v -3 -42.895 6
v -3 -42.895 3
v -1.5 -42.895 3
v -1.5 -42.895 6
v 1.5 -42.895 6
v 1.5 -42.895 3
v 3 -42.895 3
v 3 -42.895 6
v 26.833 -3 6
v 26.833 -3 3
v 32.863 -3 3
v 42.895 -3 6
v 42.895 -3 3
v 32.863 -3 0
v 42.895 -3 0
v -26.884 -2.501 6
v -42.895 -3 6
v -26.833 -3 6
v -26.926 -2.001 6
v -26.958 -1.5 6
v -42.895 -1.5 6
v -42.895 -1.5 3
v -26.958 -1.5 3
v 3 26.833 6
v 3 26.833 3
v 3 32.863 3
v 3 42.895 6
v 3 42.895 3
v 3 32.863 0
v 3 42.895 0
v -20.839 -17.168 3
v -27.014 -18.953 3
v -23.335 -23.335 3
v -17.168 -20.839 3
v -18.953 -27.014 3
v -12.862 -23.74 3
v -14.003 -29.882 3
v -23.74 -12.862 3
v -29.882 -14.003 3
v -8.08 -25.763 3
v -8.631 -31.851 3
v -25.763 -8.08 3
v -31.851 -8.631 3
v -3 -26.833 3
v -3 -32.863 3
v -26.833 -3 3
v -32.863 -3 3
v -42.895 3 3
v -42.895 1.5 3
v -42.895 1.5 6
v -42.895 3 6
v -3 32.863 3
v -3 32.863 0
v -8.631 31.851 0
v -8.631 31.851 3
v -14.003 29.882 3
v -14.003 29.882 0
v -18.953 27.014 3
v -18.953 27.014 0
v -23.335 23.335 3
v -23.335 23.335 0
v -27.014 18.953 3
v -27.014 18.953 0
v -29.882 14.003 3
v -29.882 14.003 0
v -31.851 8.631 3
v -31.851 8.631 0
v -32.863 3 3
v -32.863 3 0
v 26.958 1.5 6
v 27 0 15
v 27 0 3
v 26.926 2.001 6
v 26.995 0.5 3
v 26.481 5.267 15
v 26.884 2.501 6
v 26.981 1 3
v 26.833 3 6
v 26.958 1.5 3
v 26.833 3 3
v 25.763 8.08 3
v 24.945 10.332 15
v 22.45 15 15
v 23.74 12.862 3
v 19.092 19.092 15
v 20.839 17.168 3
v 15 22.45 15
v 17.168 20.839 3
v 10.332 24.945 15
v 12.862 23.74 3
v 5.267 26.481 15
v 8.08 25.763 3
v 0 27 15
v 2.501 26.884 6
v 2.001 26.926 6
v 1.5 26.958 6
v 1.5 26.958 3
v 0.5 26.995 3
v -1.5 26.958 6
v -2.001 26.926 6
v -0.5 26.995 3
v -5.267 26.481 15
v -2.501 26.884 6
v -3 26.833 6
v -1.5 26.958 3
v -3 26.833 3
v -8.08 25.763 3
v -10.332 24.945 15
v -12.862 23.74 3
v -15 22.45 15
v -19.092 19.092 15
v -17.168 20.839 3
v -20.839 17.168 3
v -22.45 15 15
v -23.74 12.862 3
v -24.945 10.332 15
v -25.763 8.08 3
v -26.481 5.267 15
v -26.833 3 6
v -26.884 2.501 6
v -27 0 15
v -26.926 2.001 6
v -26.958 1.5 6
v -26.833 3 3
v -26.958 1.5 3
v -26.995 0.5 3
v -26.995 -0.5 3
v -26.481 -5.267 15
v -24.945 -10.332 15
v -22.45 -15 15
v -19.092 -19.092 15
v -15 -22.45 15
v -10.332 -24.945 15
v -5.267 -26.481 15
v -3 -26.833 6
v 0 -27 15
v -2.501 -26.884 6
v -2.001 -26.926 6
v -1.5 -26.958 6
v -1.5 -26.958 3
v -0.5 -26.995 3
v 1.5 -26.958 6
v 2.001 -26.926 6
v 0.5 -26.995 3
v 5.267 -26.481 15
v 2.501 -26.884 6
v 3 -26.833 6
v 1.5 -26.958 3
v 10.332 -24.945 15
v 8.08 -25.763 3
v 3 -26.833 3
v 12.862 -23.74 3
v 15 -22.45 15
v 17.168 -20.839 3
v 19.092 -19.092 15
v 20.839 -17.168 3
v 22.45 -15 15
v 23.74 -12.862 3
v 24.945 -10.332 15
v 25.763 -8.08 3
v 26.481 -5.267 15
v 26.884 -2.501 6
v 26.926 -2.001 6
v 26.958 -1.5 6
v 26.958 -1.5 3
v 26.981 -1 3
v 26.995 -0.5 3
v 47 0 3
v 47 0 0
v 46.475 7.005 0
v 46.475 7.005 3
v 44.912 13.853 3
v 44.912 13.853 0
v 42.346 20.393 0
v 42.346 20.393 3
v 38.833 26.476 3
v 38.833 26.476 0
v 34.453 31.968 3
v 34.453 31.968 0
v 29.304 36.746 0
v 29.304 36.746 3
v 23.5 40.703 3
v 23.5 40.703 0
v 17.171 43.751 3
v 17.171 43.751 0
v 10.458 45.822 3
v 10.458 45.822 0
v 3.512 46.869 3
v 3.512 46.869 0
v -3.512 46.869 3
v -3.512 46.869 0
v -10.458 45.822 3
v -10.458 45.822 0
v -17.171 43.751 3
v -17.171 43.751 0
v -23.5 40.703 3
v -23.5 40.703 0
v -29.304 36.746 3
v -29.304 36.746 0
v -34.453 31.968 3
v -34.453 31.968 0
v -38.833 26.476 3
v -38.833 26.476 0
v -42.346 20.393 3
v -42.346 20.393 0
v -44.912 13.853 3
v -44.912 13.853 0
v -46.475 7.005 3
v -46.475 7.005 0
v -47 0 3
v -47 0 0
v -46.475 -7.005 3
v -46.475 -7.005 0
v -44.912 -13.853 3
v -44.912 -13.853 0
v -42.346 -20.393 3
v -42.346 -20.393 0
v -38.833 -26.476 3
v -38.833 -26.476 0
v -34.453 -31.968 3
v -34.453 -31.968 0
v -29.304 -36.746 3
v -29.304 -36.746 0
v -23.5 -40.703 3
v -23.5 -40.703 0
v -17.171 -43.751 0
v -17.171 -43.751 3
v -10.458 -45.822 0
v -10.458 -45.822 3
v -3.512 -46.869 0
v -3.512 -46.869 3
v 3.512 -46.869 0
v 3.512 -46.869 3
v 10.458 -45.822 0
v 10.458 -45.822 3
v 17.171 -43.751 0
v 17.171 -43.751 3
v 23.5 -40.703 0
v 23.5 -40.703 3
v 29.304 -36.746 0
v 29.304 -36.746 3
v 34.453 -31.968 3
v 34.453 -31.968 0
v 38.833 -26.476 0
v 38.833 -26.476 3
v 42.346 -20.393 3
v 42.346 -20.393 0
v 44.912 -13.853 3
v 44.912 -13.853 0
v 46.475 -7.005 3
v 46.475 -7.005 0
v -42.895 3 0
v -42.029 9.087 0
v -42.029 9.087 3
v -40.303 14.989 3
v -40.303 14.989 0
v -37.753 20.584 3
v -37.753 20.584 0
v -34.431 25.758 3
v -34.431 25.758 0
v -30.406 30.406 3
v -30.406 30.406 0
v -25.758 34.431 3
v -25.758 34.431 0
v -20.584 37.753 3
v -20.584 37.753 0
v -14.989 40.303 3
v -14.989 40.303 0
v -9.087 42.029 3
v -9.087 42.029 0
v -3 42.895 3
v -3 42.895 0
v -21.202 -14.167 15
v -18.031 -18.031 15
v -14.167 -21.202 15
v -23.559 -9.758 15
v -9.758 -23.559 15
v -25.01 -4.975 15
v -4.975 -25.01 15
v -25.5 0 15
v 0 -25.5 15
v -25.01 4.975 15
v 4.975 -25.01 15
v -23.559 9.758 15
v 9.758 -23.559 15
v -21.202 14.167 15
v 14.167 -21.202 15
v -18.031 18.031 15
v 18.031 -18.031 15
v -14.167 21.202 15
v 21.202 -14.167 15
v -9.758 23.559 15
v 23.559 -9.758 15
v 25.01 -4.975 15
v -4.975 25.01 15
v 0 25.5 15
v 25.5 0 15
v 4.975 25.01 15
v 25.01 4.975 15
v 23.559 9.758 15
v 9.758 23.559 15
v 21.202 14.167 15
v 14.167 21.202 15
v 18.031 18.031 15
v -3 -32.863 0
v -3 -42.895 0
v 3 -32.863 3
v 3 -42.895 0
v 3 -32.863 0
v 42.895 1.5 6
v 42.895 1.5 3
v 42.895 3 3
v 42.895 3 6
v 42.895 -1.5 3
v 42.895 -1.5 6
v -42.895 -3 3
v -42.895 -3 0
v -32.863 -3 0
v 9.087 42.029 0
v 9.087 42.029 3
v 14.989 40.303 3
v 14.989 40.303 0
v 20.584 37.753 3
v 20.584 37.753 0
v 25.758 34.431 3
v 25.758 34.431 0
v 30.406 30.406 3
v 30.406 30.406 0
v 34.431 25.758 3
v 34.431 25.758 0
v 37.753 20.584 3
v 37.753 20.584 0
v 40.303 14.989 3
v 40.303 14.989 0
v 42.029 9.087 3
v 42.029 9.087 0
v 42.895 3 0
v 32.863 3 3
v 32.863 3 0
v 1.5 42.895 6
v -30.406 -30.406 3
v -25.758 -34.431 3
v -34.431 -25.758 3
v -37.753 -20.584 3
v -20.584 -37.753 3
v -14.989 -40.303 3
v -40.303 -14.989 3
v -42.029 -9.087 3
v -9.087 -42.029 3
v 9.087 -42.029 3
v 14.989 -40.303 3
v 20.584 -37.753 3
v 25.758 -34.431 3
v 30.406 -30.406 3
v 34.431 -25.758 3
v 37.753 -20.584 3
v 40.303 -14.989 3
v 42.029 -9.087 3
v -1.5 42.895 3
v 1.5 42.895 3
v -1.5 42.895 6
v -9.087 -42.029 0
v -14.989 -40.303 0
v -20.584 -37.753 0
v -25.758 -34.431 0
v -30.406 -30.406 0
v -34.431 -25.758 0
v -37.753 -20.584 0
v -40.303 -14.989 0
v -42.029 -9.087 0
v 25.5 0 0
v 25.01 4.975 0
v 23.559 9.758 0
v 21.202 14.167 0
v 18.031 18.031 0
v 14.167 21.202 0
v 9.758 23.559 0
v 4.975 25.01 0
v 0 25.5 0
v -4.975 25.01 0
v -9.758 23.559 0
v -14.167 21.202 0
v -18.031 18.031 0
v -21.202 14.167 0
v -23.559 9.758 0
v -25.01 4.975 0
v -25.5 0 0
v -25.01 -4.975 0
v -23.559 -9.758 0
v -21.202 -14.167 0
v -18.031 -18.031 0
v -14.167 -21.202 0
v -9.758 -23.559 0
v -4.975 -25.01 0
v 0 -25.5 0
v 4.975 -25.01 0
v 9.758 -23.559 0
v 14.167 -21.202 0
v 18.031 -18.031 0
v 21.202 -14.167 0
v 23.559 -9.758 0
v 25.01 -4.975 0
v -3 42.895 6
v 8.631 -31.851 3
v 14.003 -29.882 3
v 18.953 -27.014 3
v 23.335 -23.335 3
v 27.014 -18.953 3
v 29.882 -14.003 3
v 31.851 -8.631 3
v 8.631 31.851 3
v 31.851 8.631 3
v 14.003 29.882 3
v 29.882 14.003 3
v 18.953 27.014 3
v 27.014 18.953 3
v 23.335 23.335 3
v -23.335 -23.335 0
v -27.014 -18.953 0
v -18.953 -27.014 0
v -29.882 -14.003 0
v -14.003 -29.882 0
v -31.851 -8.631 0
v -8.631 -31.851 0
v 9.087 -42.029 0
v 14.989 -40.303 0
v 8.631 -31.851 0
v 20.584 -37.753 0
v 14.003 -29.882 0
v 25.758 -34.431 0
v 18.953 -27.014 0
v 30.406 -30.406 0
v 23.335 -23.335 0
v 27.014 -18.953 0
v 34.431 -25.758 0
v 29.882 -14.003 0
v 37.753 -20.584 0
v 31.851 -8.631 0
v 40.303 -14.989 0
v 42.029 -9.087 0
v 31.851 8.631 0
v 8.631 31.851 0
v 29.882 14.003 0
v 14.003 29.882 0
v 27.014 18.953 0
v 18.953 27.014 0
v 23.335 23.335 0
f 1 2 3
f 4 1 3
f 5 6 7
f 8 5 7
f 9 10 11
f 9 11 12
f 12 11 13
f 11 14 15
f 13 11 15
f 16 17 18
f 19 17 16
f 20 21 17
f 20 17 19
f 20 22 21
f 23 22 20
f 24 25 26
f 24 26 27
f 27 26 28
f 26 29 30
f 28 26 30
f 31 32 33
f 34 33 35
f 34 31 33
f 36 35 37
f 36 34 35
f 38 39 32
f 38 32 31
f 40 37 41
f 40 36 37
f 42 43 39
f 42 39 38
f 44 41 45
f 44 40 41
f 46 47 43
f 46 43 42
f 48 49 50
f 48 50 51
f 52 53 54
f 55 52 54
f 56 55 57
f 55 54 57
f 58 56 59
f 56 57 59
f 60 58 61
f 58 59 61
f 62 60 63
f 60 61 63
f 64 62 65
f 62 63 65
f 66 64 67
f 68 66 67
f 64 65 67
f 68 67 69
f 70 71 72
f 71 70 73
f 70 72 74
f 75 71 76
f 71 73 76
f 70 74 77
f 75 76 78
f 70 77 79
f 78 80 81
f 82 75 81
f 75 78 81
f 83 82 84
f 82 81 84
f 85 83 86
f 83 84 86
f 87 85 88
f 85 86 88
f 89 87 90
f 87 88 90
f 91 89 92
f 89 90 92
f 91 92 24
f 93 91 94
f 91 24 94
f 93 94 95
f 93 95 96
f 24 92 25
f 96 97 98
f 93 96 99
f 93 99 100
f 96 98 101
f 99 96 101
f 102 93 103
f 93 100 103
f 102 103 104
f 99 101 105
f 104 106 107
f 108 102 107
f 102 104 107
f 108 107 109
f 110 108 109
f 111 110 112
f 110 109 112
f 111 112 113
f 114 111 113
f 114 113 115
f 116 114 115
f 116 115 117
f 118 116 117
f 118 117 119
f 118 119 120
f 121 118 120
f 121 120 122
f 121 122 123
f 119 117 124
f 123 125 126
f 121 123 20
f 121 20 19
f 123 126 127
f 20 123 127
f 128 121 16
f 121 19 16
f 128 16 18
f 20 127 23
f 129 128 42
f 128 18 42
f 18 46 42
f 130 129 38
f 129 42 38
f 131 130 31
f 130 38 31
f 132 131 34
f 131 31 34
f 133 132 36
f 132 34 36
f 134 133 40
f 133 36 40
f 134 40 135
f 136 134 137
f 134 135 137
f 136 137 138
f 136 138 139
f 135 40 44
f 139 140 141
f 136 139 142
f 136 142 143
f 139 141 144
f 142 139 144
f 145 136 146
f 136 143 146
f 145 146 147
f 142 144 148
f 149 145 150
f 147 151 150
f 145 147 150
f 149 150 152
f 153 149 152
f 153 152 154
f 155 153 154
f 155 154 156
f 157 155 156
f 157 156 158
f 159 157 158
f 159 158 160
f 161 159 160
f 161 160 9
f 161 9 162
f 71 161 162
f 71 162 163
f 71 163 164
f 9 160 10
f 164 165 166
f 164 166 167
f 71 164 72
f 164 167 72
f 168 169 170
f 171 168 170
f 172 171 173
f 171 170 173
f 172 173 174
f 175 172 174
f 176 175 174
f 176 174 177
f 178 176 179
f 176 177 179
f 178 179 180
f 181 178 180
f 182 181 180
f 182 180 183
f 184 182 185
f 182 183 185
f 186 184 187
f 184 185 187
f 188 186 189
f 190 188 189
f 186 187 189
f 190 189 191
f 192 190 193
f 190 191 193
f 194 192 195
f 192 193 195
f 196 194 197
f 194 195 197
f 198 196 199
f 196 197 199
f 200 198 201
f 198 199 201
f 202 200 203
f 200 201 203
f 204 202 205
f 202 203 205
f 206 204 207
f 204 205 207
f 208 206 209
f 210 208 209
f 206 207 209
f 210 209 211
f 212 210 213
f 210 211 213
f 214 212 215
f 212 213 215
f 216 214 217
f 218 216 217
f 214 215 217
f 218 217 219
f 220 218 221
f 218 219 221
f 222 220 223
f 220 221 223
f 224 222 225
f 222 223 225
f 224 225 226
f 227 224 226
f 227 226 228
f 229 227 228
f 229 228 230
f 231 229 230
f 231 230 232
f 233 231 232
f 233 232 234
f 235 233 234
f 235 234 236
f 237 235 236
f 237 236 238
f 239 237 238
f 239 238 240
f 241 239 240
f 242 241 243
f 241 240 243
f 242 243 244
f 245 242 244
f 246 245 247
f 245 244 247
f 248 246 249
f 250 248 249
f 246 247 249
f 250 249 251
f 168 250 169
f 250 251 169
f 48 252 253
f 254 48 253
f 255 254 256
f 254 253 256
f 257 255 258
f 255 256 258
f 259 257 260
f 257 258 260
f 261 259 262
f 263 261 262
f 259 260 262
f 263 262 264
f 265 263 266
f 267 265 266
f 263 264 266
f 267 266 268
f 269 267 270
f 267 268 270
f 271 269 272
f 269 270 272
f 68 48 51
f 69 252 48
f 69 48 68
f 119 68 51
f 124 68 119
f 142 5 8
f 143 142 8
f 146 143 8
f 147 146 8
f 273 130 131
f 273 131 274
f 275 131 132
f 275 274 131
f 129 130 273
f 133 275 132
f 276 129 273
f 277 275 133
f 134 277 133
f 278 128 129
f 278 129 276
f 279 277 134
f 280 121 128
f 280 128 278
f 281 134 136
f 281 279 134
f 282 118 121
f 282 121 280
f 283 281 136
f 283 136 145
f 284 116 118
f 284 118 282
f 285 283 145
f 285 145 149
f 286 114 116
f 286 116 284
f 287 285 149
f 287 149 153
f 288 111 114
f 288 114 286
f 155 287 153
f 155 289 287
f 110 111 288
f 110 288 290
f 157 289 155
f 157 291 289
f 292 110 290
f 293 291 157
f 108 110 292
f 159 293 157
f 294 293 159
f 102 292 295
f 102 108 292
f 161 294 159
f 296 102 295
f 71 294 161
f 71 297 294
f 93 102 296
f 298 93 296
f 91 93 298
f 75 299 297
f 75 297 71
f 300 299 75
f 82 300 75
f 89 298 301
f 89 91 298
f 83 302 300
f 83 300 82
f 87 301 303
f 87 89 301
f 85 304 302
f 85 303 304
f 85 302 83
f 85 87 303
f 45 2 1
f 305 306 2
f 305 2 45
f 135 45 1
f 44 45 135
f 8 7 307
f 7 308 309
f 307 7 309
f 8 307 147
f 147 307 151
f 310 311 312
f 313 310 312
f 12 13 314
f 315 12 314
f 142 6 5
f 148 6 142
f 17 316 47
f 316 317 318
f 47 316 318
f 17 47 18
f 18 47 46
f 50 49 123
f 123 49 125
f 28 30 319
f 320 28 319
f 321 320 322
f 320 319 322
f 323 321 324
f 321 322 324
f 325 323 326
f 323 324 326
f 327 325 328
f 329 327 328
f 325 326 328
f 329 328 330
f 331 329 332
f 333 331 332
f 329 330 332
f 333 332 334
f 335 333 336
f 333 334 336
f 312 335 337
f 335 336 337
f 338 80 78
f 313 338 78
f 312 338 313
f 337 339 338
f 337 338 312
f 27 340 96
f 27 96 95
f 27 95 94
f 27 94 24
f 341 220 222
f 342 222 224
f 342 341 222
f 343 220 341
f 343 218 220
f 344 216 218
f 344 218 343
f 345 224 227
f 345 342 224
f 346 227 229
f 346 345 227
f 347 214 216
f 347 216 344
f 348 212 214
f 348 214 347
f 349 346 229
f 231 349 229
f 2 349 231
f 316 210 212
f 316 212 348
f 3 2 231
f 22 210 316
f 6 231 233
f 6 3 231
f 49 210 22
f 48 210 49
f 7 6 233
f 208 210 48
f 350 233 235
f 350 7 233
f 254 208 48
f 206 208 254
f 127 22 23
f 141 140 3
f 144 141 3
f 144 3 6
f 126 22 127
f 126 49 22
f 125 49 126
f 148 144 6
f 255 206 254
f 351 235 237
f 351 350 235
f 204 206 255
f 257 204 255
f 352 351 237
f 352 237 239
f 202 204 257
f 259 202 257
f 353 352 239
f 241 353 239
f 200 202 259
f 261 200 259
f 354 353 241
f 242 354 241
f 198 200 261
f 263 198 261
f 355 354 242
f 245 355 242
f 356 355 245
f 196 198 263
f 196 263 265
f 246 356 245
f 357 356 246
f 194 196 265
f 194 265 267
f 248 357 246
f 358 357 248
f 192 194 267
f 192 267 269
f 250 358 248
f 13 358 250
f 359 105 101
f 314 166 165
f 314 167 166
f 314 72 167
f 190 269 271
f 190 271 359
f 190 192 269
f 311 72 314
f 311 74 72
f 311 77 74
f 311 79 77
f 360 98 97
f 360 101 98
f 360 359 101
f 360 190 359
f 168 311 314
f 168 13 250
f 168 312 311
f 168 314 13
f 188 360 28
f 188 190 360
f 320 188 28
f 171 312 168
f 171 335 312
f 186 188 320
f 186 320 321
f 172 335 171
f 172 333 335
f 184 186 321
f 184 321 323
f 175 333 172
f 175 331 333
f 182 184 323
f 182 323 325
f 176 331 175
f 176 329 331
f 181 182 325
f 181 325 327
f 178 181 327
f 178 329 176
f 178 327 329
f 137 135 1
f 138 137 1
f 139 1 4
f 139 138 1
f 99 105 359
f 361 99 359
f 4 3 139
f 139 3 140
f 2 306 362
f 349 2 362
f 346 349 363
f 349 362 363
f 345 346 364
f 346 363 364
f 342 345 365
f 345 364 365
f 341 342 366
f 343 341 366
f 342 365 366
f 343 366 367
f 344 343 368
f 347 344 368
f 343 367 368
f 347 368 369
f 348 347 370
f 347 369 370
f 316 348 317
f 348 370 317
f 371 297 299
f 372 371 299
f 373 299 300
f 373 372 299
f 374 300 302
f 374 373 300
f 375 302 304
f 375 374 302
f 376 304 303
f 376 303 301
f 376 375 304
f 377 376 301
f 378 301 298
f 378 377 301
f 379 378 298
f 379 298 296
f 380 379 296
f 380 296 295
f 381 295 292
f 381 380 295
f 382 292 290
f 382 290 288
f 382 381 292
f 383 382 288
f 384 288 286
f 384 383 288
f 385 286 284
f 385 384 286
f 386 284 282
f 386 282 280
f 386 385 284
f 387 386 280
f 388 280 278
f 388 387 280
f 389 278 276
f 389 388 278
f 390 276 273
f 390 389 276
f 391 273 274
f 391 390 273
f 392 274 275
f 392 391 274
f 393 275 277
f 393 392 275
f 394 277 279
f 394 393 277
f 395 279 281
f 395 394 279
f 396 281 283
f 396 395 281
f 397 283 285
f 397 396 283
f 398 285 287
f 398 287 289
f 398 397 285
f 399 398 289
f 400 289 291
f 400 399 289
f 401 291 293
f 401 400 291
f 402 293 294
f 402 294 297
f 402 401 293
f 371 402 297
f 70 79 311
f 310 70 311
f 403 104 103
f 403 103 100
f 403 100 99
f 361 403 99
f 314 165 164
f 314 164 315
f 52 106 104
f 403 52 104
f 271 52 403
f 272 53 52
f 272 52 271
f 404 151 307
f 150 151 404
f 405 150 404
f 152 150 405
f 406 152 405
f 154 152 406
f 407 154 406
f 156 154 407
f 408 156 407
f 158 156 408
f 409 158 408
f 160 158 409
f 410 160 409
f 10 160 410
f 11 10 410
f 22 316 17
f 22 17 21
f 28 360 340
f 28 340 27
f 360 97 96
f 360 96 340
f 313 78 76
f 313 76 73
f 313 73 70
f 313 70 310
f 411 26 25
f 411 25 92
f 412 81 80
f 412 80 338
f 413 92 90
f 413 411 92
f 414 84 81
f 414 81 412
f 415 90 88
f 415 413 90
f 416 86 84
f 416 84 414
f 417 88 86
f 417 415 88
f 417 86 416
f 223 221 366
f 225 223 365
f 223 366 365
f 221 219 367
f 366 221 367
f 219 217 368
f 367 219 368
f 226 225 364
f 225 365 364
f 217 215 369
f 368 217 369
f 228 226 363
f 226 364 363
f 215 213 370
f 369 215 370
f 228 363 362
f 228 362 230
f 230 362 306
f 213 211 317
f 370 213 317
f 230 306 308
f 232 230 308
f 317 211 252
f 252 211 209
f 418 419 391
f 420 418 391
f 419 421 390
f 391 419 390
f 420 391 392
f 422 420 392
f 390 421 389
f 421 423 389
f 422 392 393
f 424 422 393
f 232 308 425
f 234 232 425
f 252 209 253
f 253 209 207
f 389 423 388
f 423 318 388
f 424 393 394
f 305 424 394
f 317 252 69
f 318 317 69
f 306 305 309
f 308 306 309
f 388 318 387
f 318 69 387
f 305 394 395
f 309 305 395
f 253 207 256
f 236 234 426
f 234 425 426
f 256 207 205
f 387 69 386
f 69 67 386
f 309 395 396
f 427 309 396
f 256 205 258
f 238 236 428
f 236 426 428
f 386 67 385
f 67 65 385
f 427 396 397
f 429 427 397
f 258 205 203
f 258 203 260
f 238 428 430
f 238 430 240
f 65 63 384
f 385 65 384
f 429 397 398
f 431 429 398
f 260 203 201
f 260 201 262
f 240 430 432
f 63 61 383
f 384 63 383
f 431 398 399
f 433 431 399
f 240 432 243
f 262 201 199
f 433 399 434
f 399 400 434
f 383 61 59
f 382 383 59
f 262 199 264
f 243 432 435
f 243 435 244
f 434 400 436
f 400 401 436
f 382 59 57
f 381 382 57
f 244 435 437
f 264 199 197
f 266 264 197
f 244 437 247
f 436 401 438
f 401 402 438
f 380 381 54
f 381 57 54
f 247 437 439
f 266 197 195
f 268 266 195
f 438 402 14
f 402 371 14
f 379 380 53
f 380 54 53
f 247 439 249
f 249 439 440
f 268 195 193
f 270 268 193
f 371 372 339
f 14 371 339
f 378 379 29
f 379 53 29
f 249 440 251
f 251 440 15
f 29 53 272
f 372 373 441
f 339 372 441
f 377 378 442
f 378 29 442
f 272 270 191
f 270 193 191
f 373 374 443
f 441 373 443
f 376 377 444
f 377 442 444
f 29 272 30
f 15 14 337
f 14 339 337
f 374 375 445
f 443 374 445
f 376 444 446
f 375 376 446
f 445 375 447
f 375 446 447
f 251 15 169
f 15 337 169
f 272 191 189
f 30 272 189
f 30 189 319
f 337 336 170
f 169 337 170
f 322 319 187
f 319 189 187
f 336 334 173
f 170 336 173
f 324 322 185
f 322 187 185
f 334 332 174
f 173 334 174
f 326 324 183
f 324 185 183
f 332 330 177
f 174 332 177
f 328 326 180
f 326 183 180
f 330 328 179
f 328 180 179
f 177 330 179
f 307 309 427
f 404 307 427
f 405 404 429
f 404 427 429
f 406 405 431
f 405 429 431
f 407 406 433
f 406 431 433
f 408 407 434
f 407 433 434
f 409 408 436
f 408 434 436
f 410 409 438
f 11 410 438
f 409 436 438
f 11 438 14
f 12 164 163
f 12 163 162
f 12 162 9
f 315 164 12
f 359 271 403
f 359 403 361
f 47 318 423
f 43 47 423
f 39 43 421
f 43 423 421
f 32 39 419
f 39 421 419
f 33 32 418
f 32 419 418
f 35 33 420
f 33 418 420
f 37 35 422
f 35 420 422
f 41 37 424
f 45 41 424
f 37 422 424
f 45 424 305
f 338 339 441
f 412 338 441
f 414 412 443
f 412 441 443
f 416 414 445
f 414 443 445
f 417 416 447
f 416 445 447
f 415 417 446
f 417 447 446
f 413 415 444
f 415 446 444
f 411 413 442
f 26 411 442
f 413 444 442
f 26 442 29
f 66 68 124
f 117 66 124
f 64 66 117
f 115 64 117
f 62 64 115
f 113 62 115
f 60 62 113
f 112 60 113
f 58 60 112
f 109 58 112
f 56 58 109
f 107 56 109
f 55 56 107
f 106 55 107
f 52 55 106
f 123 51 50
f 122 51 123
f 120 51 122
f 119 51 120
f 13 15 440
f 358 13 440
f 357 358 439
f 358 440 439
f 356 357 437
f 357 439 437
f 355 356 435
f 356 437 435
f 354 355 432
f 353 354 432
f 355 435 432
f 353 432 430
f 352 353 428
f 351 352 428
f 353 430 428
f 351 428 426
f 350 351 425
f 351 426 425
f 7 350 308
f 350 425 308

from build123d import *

# Parameters (mm, degrees)
F0_R     = 27
F0_R_2   = 25.5
F1_DEPTH = 15
F0_R_3   = 47
F2_DEPTH = 3
F3_W     = 16.0624054491
F3_H     = 1.5
F3_W_2   = 1.5
F3_H_2   = 16.0624054491
F4_DEPTH = 3
F5_DEPTH = 3


with BuildPart() as f1:
    # F0 (on Top) → F1 (new body)
    with BuildSketch(Plane.XY):
        Circle(F0_R)
        Circle(F0_R_2, mode=Mode.SUBTRACT)
    extrude(amount=F1_DEPTH)

    # F0 (on Top) → F2 (join)
    with BuildSketch(Plane.XY):
        Circle(F0_R_3)
        with BuildLine():
            ThreePointArc((-3, -42.8952211791), (-30.405591591, -30.405591591), (-42.8952211791, -3))
            Line((-42.8952211791, -3), (-32.8633534503, -3))
            ThreePointArc((-32.8633534503, -3), (-23.3345237792, -23.3345237792), (-3, -32.8633534503))
            Line((-3, -32.8633534503), (-3, -42.8952211791))
        make_face(mode=Mode.SUBTRACT)
        with BuildLine():
            ThreePointArc((3, -32.8633534503), (23.3345237792, -23.3345237792), (32.8633534503, -3))
            Line((32.8633534503, -3), (42.8952211791, -3))
            ThreePointArc((42.8952211791, -3), (30.405591591, -30.405591591), (3, -42.8952211791))
            Line((3, -42.8952211791), (3, -32.8633534503))
        make_face(mode=Mode.SUBTRACT)
        with BuildLine():
            ThreePointArc((-3, 32.8633534503), (-23.3345237792, 23.3345237792), (-32.8633534503, 3))
            Line((-32.8633534503, 3), (-42.8952211791, 3))
            ThreePointArc((-42.8952211791, 3), (-30.405591591, 30.405591591), (-3, 42.8952211791))
            Line((-3, 42.8952211791), (-3, 32.8633534503))
        make_face(mode=Mode.SUBTRACT)
        Circle(F0_R, mode=Mode.SUBTRACT)
        with BuildLine():
            Line((42.8952211791, 3), (32.8633534503, 3))
            ThreePointArc((32.8633534503, 3), (23.3345237792, 23.3345237792), (3, 32.8633534503))
            Line((3, 32.8633534503), (3, 42.8952211791))
            ThreePointArc((3, 42.8952211791), (30.405591591, 30.405591591), (42.8952211791, 3))
        make_face(mode=Mode.SUBTRACT)
    extrude(amount=F2_DEPTH)

    # F3 (on face) → F4 (join)
    with BuildSketch(Plane.XY.offset(3)):
        with Locations((-34.8640184545, 2.25)):
            Rectangle(F3_W, F3_H)
        with Locations((-34.8640184545, -2.25)):
            Rectangle(F3_W, F3_H)
        with Locations((34.8640184545, 2.25)):
            Rectangle(F3_W, F3_H)
        with Locations((34.8640184545, -2.25)):
            Rectangle(F3_W, F3_H)
        with Locations((-2.25, 34.8640184545)):
            Rectangle(F3_W_2, F3_H_2)
        with Locations((2.25, 34.8640184545)):
            Rectangle(F3_W_2, F3_H_2)
        with Locations((-2.25, -34.8640184545)):
            Rectangle(F3_W_2, F3_H_2)
        with Locations((2.25, -34.8640184545)):
            Rectangle(F3_W_2, F3_H_2)
    extrude(amount=F4_DEPTH)

    # F3 (on face) → F5 (join)
    with BuildSketch(Plane.XY.offset(3)):
        with Locations((-34.8640184545, 2.25)):
            Rectangle(F3_W, F3_H)
        with Locations((-34.8640184545, -2.25)):
            Rectangle(F3_W, F3_H)
        with Locations((34.8640184545, 2.25)):
            Rectangle(F3_W, F3_H)
        with Locations((34.8640184545, -2.25)):
            Rectangle(F3_W, F3_H)
        with Locations((-2.25, 34.8640184545)):
            Rectangle(F3_W_2, F3_H_2)
        with Locations((2.25, 34.8640184545)):
            Rectangle(F3_W_2, F3_H_2)
        with Locations((-2.25, -34.8640184545)):
            Rectangle(F3_W_2, F3_H_2)
        with Locations((2.25, -34.8640184545)):
            Rectangle(F3_W_2, F3_H_2)
    extrude(amount=-F5_DEPTH)


solid = f1.part
